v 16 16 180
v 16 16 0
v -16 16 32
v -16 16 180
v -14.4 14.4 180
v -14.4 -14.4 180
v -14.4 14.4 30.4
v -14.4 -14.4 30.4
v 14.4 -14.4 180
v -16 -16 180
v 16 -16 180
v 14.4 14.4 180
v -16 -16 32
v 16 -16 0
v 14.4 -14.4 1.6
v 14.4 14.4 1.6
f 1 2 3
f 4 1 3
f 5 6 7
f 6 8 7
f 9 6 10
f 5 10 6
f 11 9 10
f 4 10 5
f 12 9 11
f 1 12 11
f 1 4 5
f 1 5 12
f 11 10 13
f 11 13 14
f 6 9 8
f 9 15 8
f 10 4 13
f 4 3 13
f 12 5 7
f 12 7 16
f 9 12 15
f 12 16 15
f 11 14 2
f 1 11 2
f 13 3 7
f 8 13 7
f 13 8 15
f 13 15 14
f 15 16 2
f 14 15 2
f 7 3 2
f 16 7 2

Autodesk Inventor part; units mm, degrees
ref_plane "YZ Plane" through (0, 0, 0) normal (1, 0, 0) x (0, 1, 0)
ref_plane "XZ Plane" through (0, 0, 0) normal (0, 1, 0) x (-1, 0, 0)
ref_plane "XY Plane" through (0, 0, 0) normal (0, 0, 1) x (1, 0, 0)
sketch "スケッチ1" plane through (0, 0, 0) normal (0, 0, 1) x (1, 0, 0)
  line L0 (-16, -16) -> (16, -16)
  line L1 (16, -16) -> (16, 16)
  line L2 (16, 16) -> (-16, 16)
  line L3 (-16, 16) -> (-16, -16)
  line L4 (-16, -16) -> (16, 16) construction
  line L5 (16, -16) -> (-16, 16) construction
  line L6 (-14.4, 14.4) -> (14.4, 14.4)
  line L7 (14.4, 14.4) -> (14.4, -14.4)
  line L8 (14.4, -14.4) -> (-14.4, -14.4)
  line L9 (-14.4, -14.4) -> (-14.4, 14.4)
  point P0 (0, 0)
  dimension "d0" = 32
  dimension "d1" = 32
  dimension "d2" = 1.6
extrude "押し出し1" add sketch "スケッチ1" along normal blind 180
chamfer "面取り1" distance 32 angle 45 1 edges at (-16, 0, 0)
properties part number "PipeB"
